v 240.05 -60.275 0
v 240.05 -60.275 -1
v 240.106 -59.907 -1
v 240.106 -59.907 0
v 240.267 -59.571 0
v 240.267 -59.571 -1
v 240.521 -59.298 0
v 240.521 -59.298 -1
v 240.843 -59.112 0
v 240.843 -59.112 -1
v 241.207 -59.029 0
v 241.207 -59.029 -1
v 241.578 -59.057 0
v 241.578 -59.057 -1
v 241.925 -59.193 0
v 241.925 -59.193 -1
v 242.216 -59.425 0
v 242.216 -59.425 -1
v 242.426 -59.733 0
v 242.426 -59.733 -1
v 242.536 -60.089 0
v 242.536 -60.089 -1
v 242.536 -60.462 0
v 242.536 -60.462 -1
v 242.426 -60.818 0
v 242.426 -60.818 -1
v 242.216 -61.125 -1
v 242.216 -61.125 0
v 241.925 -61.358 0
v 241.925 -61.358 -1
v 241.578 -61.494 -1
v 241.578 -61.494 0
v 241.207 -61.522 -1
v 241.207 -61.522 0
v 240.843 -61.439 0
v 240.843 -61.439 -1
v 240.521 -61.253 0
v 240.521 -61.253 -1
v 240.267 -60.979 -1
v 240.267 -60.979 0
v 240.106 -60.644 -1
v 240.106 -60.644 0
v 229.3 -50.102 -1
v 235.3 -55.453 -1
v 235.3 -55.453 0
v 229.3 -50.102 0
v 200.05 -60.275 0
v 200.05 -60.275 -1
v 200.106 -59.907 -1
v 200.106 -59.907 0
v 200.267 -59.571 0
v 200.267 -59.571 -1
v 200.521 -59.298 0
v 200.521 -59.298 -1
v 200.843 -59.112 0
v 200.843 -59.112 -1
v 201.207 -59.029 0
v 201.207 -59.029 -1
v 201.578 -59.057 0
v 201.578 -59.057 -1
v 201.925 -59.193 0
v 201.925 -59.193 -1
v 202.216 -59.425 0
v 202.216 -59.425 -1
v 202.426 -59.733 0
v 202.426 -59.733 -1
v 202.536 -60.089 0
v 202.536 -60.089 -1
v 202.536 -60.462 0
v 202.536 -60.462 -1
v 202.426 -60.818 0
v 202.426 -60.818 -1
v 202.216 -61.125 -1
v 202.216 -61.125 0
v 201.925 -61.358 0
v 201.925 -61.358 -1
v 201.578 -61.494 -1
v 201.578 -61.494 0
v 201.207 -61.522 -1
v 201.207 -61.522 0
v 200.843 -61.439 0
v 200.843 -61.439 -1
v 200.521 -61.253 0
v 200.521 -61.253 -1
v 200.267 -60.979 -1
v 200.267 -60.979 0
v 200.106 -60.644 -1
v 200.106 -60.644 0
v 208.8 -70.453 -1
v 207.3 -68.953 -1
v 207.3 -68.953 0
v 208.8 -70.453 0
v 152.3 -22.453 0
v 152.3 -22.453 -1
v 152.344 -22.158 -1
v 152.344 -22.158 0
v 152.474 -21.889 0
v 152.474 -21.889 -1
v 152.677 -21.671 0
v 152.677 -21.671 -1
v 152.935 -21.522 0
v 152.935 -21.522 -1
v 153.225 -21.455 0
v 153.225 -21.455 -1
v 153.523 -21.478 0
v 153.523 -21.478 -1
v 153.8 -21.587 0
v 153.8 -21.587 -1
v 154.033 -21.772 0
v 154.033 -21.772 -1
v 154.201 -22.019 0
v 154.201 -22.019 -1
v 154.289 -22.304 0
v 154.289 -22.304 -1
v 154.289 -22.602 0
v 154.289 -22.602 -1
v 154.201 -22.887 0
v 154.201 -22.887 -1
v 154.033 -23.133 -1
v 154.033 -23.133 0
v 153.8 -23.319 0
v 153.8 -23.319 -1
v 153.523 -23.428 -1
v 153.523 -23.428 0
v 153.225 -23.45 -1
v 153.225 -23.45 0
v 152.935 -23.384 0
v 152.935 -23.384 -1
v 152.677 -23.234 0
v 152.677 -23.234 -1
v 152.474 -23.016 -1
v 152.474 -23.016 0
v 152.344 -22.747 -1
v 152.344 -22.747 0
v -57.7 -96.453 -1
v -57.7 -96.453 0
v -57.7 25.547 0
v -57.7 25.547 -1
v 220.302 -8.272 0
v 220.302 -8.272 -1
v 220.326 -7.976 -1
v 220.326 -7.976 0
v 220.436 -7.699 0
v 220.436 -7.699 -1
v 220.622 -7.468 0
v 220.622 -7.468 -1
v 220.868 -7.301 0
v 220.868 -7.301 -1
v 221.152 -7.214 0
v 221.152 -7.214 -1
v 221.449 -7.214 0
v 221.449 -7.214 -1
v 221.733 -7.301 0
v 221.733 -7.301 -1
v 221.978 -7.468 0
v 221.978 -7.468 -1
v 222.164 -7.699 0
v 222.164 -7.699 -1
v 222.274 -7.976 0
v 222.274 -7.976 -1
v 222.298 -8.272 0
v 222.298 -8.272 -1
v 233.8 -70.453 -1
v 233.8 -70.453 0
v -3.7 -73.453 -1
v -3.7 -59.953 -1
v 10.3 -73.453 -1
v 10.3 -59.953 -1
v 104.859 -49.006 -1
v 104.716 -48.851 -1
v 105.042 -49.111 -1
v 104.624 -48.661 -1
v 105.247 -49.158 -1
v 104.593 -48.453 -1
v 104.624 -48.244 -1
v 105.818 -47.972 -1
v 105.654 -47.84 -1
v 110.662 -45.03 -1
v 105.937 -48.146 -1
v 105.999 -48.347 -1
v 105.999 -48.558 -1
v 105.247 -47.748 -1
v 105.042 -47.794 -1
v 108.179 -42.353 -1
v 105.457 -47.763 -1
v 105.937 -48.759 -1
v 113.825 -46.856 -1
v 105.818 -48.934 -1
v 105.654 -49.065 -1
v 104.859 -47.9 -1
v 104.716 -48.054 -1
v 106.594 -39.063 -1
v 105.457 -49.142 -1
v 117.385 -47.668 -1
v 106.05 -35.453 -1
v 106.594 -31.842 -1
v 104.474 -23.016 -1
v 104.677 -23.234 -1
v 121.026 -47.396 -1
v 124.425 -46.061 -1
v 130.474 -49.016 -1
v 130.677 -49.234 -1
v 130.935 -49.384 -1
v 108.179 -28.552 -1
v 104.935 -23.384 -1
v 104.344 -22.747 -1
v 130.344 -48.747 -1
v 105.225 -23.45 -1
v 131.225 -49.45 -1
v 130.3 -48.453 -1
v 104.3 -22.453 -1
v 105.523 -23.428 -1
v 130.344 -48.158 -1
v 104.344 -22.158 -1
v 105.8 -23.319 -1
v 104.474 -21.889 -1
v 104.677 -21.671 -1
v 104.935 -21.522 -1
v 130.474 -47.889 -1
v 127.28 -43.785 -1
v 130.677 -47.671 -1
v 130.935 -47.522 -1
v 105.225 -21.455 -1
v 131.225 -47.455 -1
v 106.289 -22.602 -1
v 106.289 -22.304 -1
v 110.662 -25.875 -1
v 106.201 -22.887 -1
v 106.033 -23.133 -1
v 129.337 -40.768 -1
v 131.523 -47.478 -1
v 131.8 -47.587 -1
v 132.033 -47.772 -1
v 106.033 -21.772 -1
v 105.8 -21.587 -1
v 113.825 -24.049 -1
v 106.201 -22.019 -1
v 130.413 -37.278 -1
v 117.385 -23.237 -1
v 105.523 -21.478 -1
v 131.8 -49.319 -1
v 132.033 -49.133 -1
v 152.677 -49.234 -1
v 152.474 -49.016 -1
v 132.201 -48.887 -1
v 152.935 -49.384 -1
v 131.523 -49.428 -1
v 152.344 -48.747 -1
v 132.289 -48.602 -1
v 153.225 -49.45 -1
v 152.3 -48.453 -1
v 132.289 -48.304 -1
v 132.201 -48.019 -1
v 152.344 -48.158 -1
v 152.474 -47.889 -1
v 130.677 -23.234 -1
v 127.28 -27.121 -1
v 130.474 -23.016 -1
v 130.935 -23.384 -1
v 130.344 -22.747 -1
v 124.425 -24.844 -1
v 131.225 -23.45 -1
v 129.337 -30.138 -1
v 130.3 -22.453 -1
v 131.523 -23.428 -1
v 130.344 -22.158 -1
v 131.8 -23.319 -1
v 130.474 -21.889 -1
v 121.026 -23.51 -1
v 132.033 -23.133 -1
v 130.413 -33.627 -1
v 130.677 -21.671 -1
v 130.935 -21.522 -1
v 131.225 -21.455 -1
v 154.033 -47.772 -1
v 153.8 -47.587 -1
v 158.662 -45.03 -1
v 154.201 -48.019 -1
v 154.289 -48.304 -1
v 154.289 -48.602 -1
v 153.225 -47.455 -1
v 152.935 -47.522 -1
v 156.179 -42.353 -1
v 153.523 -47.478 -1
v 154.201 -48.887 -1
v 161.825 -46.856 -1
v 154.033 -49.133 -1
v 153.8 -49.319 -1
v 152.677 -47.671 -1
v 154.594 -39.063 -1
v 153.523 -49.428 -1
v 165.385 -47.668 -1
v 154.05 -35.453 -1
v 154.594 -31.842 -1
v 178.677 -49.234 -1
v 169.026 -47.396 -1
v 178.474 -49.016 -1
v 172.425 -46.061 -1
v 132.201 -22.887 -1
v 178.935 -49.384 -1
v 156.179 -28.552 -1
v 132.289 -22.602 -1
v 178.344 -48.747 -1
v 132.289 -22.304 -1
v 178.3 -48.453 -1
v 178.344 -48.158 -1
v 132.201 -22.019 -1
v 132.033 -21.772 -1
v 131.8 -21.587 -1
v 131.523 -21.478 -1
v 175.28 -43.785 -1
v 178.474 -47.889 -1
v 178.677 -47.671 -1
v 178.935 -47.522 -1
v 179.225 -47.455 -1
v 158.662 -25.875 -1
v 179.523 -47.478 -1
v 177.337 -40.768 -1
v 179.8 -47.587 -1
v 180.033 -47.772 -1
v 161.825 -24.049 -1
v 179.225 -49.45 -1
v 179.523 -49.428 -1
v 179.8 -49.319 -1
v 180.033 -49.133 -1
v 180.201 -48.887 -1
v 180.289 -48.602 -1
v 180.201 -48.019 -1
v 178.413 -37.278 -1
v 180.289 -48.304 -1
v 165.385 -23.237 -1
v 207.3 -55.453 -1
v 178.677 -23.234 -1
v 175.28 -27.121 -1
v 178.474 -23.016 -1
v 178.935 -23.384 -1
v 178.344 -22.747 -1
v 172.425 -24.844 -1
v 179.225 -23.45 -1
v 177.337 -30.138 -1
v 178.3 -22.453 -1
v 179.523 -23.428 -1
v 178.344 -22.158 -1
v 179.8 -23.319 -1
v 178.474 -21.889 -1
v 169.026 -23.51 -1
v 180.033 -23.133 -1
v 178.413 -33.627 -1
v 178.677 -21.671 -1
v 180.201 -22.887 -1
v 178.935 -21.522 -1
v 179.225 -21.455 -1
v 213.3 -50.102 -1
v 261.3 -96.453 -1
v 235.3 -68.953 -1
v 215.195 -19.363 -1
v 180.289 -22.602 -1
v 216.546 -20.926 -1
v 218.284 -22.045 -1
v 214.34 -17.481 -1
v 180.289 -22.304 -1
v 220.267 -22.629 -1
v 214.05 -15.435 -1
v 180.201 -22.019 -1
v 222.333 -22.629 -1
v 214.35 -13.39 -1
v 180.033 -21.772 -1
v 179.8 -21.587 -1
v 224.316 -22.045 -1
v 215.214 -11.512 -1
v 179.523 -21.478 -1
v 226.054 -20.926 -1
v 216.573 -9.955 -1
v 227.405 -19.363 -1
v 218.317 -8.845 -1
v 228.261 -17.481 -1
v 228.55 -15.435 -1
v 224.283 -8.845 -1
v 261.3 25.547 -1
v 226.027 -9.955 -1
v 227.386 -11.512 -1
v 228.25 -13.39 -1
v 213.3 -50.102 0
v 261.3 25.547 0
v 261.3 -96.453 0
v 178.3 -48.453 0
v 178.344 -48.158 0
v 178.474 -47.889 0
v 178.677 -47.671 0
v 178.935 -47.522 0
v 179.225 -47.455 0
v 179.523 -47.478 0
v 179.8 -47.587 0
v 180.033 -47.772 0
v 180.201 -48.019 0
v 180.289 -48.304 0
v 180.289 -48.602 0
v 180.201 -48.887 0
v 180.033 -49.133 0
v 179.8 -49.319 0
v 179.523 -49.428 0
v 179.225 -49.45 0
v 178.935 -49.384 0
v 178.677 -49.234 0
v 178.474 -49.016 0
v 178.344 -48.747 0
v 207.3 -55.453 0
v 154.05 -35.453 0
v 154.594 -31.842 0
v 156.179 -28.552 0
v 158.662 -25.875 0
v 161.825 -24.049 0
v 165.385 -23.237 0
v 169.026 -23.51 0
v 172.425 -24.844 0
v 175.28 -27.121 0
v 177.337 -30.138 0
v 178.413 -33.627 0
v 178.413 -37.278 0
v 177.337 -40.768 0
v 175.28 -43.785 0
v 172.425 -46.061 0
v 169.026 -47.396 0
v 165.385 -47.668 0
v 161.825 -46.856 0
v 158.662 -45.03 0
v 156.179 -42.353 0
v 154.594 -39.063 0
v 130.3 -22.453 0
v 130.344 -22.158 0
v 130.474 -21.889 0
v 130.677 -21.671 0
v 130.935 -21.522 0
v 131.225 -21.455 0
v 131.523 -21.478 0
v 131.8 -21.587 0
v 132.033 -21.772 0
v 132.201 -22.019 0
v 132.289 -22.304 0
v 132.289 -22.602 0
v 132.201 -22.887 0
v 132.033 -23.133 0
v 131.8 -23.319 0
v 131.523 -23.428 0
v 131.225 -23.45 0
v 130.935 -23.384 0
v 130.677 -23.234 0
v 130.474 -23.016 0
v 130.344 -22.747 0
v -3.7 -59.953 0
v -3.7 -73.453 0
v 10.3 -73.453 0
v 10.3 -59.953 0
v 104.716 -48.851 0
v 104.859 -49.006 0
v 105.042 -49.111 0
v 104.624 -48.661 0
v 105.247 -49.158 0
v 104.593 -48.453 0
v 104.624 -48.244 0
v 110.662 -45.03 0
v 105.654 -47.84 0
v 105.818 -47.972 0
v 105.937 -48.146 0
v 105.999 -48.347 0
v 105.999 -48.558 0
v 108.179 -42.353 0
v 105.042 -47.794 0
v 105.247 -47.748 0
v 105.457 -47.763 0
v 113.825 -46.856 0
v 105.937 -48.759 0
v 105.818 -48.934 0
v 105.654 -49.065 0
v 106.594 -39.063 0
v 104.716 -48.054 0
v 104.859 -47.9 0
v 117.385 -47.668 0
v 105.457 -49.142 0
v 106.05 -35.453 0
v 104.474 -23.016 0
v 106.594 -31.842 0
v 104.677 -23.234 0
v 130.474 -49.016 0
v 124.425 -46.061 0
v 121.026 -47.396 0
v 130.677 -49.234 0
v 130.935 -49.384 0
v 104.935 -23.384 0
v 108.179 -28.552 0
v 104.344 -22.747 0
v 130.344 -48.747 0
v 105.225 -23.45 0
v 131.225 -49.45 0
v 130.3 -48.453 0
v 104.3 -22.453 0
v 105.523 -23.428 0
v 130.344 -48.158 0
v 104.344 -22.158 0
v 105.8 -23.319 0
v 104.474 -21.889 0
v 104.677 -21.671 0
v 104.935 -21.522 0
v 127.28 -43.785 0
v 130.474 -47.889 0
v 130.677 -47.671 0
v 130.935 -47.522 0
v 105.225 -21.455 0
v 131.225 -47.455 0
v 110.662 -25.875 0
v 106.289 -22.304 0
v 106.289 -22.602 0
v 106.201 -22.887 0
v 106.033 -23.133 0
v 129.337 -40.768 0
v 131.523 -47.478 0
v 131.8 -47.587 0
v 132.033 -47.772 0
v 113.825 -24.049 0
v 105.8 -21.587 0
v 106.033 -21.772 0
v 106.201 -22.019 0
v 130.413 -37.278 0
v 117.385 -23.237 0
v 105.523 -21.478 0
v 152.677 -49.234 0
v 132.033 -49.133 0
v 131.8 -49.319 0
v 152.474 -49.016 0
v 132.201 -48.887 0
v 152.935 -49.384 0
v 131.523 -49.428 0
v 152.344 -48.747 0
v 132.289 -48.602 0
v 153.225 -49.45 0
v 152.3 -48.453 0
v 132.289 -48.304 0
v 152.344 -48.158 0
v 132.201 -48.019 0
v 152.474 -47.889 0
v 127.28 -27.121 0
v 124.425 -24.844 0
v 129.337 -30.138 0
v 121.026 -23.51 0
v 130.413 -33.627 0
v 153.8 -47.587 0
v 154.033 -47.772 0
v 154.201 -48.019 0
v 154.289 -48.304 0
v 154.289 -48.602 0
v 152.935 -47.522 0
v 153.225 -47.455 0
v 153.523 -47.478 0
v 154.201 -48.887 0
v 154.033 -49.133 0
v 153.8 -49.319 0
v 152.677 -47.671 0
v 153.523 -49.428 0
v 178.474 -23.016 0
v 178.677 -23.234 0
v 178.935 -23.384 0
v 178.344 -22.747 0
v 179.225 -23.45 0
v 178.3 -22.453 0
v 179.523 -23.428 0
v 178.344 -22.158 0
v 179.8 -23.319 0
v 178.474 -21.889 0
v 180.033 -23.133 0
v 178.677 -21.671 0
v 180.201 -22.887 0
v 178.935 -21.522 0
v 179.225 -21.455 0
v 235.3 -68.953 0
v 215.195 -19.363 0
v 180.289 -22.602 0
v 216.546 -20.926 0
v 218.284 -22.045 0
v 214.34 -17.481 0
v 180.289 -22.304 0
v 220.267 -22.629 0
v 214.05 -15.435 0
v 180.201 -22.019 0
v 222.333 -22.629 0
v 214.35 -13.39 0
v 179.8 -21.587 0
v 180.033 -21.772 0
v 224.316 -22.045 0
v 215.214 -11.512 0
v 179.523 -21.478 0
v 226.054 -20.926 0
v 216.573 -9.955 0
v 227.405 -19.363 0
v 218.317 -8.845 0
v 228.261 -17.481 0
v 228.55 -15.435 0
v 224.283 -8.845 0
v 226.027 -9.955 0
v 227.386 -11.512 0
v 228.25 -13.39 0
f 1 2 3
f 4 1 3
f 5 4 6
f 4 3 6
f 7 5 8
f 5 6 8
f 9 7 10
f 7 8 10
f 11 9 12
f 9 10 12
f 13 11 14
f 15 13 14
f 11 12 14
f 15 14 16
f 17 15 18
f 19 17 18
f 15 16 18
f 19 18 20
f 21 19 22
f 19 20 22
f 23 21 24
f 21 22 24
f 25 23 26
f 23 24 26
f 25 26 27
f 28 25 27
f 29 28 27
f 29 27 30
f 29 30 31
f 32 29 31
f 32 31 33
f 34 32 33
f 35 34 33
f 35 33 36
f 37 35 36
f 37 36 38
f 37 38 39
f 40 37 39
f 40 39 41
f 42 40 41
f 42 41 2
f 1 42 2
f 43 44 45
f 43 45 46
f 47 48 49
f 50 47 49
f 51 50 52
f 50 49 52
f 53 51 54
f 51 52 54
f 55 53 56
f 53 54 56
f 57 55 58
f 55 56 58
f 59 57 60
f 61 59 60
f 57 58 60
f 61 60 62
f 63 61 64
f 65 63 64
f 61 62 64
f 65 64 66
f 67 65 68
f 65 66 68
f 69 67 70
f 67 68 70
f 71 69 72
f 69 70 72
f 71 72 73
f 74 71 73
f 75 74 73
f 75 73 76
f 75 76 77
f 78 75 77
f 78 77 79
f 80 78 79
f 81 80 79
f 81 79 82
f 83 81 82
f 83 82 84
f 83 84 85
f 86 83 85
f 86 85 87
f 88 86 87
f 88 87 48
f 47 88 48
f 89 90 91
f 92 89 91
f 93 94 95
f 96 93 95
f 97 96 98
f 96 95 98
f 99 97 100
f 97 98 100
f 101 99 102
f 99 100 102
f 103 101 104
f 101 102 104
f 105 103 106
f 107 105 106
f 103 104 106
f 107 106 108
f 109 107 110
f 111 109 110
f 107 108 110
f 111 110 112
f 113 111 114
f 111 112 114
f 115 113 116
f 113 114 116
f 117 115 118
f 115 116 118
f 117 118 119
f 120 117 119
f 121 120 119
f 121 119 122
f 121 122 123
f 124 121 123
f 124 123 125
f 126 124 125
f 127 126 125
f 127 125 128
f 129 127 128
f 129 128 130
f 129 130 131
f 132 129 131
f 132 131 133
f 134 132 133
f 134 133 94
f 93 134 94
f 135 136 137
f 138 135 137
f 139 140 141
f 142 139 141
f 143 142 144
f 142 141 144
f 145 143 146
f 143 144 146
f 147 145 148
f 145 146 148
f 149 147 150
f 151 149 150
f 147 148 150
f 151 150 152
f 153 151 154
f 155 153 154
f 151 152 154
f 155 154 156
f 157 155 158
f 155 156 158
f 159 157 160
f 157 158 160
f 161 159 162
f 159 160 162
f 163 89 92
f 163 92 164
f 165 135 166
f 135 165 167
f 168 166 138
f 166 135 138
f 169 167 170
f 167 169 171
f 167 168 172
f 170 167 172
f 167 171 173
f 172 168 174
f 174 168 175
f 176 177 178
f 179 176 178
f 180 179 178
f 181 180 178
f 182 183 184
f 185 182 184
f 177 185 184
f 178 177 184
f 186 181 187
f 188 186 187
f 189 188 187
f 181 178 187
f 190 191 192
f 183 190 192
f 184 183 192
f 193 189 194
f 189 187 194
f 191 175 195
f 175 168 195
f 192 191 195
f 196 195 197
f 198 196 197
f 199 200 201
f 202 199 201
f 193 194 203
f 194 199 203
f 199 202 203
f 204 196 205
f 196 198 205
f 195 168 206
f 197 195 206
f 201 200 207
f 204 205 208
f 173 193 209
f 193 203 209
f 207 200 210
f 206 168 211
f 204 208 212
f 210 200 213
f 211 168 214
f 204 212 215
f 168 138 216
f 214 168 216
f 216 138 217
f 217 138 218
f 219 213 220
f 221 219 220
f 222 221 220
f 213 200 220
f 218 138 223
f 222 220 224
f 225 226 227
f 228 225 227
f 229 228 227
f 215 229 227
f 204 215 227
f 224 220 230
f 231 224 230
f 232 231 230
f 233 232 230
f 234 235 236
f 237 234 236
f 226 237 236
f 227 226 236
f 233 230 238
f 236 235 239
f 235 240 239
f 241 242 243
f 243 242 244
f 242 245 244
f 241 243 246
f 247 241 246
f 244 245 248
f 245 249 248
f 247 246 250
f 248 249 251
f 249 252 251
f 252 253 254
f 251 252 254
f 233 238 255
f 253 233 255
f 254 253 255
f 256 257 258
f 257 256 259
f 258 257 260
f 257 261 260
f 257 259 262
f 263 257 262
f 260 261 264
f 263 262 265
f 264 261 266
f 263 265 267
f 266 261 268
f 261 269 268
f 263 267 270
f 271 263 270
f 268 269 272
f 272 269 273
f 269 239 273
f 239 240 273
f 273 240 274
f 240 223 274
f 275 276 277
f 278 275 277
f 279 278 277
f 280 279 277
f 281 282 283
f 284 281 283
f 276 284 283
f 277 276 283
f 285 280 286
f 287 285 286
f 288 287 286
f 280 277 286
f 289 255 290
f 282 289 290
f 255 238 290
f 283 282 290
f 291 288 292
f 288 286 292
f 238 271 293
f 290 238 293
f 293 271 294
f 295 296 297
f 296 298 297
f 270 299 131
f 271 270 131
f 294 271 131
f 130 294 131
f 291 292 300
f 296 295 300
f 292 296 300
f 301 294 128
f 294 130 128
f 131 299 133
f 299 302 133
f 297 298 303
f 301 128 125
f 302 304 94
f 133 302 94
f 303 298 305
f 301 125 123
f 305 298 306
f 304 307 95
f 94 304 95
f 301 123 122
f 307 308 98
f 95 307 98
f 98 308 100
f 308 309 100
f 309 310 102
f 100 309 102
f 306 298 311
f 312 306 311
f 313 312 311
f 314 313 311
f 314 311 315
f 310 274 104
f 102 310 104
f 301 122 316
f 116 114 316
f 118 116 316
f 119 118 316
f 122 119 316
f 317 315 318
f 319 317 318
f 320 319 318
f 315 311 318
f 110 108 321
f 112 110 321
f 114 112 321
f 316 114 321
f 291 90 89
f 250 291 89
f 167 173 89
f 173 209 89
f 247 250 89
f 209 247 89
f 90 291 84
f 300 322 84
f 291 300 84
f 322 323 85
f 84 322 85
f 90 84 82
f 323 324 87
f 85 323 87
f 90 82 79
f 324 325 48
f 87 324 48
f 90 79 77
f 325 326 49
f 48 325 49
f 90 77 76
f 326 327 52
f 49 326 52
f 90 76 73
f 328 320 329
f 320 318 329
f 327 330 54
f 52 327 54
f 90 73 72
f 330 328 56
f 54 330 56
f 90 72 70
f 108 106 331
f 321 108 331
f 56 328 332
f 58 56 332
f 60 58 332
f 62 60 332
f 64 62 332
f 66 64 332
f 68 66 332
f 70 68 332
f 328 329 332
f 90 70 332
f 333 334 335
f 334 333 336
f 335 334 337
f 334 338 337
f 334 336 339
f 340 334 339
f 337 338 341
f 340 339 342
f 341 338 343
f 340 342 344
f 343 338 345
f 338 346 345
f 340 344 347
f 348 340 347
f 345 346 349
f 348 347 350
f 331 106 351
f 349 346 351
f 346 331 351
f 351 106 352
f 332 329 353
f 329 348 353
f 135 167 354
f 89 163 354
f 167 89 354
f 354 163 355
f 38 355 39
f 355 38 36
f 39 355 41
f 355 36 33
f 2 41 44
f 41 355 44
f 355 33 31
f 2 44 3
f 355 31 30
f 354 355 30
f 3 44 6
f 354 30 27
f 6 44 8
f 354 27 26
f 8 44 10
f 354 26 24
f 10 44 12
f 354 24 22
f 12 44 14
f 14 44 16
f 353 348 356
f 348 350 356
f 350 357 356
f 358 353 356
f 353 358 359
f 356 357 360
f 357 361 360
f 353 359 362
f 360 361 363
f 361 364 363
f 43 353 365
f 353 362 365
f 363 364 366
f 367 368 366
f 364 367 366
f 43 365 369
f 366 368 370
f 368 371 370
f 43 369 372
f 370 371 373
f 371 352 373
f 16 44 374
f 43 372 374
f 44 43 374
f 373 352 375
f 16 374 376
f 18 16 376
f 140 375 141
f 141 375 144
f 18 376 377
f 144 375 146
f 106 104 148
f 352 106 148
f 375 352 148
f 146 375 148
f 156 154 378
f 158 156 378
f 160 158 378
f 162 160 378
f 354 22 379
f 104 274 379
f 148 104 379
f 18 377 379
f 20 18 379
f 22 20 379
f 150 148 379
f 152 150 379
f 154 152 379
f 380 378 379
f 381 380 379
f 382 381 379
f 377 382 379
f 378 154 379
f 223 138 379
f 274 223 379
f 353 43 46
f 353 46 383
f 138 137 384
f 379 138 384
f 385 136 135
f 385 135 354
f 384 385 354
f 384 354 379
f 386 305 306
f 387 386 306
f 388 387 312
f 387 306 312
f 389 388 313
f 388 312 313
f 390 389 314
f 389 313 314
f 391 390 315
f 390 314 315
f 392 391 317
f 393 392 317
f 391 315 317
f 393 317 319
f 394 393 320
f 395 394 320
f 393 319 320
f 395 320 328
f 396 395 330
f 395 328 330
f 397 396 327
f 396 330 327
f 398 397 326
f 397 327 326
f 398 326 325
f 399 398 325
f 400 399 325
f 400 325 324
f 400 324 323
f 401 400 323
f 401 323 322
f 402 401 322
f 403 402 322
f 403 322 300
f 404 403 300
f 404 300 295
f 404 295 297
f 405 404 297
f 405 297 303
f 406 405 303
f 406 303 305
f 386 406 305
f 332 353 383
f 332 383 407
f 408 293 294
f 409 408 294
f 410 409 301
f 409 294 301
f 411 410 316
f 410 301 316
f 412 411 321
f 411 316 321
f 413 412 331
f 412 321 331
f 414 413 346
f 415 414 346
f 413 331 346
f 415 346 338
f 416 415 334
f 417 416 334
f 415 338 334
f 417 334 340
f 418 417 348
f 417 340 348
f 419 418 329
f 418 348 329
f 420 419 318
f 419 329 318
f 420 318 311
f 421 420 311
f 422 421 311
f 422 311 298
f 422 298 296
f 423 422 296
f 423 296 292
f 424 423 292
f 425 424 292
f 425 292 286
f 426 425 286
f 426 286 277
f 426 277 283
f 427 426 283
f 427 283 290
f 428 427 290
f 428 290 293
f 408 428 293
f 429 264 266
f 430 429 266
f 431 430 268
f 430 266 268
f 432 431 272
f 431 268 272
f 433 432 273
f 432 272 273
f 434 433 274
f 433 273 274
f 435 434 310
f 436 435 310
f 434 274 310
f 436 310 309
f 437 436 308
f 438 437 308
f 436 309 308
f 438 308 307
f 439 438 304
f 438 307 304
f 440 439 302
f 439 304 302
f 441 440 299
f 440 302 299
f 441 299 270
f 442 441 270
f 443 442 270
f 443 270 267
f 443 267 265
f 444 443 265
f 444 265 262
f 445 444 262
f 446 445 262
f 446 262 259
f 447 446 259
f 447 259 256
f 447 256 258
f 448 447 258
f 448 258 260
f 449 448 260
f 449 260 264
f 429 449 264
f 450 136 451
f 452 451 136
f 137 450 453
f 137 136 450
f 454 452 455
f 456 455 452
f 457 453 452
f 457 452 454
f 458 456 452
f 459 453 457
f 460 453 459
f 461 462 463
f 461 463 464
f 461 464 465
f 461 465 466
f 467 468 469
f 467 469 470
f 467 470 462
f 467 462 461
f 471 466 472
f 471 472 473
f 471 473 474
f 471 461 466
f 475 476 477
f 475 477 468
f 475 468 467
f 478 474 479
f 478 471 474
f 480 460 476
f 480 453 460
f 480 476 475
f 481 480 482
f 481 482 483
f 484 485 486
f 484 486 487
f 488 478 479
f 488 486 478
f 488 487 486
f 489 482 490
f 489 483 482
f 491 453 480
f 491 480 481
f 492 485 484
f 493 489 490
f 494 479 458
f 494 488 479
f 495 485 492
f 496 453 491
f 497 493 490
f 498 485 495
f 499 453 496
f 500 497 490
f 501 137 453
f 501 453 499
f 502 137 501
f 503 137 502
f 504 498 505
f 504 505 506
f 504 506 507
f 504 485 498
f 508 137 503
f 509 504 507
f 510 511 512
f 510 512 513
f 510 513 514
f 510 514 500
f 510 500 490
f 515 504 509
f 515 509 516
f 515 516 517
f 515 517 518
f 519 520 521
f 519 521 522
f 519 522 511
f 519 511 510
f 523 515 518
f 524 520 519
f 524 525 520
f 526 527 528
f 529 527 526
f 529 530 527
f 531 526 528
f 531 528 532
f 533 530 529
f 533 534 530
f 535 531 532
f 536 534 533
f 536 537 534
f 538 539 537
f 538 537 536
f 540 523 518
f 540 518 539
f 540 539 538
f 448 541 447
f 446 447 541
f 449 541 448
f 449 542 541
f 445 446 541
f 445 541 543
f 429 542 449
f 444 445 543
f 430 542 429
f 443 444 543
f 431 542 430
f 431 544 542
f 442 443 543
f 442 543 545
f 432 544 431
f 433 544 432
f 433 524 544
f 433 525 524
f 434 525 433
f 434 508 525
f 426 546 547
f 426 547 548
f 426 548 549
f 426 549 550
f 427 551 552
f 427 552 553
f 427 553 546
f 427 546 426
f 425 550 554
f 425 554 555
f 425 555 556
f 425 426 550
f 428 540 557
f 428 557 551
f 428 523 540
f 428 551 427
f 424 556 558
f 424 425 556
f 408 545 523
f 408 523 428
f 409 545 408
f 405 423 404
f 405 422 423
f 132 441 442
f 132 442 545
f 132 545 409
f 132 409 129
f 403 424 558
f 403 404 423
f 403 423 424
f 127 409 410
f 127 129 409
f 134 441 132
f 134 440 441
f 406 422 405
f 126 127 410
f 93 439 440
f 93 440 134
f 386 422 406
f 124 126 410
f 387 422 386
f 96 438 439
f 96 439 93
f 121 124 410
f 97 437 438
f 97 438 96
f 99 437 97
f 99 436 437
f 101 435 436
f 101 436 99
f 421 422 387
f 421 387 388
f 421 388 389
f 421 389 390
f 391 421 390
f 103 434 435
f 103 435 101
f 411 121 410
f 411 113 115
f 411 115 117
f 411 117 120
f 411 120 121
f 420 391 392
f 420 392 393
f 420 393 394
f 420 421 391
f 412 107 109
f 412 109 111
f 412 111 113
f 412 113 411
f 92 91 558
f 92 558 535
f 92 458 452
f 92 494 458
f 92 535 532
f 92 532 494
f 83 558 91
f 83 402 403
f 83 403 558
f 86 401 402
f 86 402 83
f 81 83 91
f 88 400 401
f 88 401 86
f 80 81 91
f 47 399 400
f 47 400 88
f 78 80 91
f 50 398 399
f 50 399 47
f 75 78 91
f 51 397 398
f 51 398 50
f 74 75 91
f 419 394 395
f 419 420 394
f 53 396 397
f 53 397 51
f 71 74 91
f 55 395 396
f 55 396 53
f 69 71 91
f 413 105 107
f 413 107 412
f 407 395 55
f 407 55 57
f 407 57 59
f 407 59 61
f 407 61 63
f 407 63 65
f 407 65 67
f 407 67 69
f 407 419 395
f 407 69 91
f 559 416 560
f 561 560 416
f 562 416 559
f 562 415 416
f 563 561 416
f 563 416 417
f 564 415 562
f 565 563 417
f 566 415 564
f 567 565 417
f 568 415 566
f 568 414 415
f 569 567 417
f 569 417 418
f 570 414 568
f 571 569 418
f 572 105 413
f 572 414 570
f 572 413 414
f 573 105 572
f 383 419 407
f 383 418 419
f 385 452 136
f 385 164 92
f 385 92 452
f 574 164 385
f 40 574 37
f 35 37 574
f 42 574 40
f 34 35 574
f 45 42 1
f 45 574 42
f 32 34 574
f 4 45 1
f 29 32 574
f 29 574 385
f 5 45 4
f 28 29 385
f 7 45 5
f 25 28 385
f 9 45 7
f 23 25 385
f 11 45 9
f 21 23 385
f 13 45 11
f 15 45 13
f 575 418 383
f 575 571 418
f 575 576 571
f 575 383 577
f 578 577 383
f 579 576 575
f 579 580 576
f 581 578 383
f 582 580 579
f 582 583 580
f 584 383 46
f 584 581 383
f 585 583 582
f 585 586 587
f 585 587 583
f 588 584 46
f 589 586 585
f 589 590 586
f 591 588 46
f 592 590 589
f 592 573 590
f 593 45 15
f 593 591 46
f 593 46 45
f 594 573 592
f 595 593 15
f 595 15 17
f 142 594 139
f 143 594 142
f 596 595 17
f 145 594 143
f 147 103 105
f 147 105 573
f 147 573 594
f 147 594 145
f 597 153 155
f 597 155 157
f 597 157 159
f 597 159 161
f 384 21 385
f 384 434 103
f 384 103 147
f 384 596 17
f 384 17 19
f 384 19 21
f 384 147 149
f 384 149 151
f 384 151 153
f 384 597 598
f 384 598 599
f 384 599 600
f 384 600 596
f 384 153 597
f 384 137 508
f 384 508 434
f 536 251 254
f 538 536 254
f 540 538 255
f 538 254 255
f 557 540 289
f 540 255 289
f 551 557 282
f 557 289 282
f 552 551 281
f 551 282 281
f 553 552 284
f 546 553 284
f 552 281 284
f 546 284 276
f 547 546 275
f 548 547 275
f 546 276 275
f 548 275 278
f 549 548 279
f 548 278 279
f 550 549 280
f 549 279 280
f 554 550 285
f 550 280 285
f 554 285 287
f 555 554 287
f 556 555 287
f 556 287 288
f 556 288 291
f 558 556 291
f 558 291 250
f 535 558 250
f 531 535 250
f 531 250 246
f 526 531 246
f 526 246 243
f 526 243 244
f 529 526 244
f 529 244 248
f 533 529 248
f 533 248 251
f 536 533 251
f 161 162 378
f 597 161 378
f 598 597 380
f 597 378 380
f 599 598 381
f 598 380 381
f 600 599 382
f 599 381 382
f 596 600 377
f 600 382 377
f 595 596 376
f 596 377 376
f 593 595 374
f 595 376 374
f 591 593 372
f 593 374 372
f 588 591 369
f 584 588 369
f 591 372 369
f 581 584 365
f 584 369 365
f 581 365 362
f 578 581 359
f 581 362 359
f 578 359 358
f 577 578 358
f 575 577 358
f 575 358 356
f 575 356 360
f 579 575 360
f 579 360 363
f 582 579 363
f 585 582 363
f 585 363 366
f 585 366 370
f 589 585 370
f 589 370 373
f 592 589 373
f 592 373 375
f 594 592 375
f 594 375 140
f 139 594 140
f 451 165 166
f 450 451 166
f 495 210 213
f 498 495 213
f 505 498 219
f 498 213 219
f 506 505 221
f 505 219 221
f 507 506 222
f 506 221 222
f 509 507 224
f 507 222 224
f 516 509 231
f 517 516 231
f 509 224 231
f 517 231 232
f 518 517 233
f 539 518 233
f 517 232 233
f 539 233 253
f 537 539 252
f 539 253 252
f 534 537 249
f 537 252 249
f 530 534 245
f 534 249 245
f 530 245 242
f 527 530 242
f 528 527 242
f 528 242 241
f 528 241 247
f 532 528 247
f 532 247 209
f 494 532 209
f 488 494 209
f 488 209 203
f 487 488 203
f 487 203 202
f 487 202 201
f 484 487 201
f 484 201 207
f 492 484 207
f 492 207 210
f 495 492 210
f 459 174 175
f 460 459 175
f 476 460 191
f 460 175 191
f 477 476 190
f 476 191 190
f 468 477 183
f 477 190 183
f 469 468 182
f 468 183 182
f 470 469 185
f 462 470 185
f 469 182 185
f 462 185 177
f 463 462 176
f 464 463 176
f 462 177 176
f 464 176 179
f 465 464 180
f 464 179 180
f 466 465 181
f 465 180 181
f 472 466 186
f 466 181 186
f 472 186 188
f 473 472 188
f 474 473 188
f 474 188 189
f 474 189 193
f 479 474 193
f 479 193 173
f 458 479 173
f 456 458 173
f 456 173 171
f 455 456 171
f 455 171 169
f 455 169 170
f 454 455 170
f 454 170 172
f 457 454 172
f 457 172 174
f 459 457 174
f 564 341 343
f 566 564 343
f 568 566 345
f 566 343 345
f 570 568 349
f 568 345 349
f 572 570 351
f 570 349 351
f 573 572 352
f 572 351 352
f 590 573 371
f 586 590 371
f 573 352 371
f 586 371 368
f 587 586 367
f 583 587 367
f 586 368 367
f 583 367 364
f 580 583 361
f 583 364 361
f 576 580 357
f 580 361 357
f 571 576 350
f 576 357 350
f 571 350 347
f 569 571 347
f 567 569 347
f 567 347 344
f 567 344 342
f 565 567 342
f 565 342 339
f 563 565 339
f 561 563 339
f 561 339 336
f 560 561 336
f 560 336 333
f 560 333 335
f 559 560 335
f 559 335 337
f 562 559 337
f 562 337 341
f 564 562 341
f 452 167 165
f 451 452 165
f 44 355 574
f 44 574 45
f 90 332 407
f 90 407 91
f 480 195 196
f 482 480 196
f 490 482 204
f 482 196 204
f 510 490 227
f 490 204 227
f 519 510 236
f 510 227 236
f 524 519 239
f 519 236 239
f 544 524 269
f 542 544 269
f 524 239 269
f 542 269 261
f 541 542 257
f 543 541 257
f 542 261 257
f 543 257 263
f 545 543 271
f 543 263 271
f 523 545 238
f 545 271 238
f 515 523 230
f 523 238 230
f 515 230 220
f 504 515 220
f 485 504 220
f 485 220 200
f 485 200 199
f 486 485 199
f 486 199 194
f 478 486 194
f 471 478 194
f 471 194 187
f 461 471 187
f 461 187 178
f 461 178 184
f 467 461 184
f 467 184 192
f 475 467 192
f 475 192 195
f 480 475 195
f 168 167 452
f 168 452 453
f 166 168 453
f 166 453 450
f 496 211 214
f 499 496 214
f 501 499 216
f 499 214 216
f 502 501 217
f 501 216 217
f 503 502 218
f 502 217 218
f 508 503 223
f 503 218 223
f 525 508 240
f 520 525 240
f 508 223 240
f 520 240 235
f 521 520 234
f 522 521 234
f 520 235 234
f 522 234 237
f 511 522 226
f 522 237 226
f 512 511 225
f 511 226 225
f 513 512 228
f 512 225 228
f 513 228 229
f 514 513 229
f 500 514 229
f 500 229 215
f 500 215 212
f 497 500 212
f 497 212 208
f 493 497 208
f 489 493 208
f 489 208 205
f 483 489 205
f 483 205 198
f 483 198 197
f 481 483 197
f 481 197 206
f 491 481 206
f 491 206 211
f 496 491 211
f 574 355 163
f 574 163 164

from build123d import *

# Parameters (mm, degrees)
SKETCH_1_W             = 319
SKETCH_1_H             = 122
SM_BASE_FLANGE_1_DEPTH = 1
SKETCH_2_R             = 12.25
CUT_EXTRUDE_1_DEPTH    = 10
SKETCH_3_R             = 1
SKETCH_3_R_2           = 0.707106781
CUT_EXTRUDE_2_DEPTH    = 10
CUT_EXTRUDE_3_DEPTH    = 10
SKETCH_5_R             = 1.25
CUT_EXTRUDE_4_DEPTH    = 10
CHAMFER_1_SIZE         = 1.5
SKETCH_6_W             = 14
SKETCH_6_H             = 13.5
CUT_EXTRUDE_5_DEPTH    = 10


# Sheet-metal steps are written as plain solids
with BuildPart() as part:
    # Sketch 1 → Базовая кромка1 (new body)
    with BuildSketch(Plane.XY):
        with Locations((101.800049421, -35.452668213)):
            Rectangle(SKETCH_1_W, SKETCH_1_H)
    extrude(amount=-SM_BASE_FLANGE_1_DEPTH)

    # Эскиз2 → Вырез-Вытянуть1 (cut)
    with BuildSketch(Plane(origin=(0, 0, -1), x_dir=(-1, 0, 0), z_dir=(0, 0, -1))):
        with Locations((-166.300049421, -35.452668213)):
            Circle(SKETCH_2_R)
        with Locations((-118.300049421, -35.452668213)):
            Circle(SKETCH_2_R)
        with BuildLine():
            ThreePointArc((-222.297668465, -8.271633731), (-221.300049421, -22.702668213), (-220.302430377, -8.271633731))
            ThreePointArc((-220.302430377, -8.271633731), (-221.300049421, -7.202668213), (-222.297668465, -8.271633731))
        make_face()
    extrude(amount=-CUT_EXTRUDE_1_DEPTH, mode=Mode.SUBTRACT)

    # Эскиз3 → Вырез-Вытянуть2 (cut)
    with BuildSketch(Plane(origin=(0, 0, -1), x_dir=(-1, 0, 0), z_dir=(0, 0, -1))):
        with Locations((-179.300049421, -22.452668213)):
            Circle(SKETCH_3_R)
        with Locations((-153.300049421, -22.452668213)):
            Circle(SKETCH_3_R)
        with Locations((-179.300049421, -48.452668213)):
            Circle(SKETCH_3_R)
        with Locations((-153.300049421, -48.452668213)):
            Circle(SKETCH_3_R)
        with Locations((-131.300049421, -48.452668213)):
            Circle(SKETCH_3_R)
        with Locations((-105.300049421, -48.452668213)):
            Circle(SKETCH_3_R_2)
        with Locations((-131.300049421, -22.452668213)):
            Circle(SKETCH_3_R)
        with Locations((-105.300049421, -22.452668213)):
            Circle(SKETCH_3_R)
    extrude(amount=-CUT_EXTRUDE_2_DEPTH, mode=Mode.SUBTRACT)

    # Эскиз4 → Вырез-Вытянуть3 (cut)
    with BuildSketch(Plane(origin=(0, 0, -1), x_dir=(-1, 0, 0), z_dir=(0, 0, -1))):
        Polygon((-213.300049421, -50.101915565), (-207.300049421, -55.452668213), (-207.300049421, -70.452668213), (-235.300049421, -70.452668213), (-235.300049421, -55.452668213), (-229.300049421, -50.101915565), align=None)
    extrude(amount=-CUT_EXTRUDE_3_DEPTH, mode=Mode.SUBTRACT)

    # Эскиз5 → Вырез-Вытянуть4 (cut)
    with BuildSketch(Plane(origin=(0, 0, -1), x_dir=(-1, 0, 0), z_dir=(0, 0, -1))):
        with Locations((-241.300049425, -60.275234132)):
            Circle(SKETCH_5_R)
        with Locations((-201.300049425, -60.275234132)):
            Circle(SKETCH_5_R)
    extrude(amount=-CUT_EXTRUDE_4_DEPTH, mode=Mode.SUBTRACT)

    # Фаска1
    chamfer_1_edges = [part.edges().sort_by_distance(p)[0] for p in [
        (207.300049421, -70.452668213, -0.5),
        (235.300049421, -70.452668213, -0.5),
    ]]
    chamfer(chamfer_1_edges, length=CHAMFER_1_SIZE)

    # Эскиз6 → Вырез-Вытянуть5 (cut)
    with BuildSketch(Plane(origin=(0, 0, -1), x_dir=(-1, 0, 0), z_dir=(0, 0, -1))):
        with Locations((-3.300049421, -66.702668213)):
            Rectangle(SKETCH_6_W, SKETCH_6_H)
    extrude(amount=-CUT_EXTRUDE_5_DEPTH, mode=Mode.SUBTRACT)


solid = part.part
